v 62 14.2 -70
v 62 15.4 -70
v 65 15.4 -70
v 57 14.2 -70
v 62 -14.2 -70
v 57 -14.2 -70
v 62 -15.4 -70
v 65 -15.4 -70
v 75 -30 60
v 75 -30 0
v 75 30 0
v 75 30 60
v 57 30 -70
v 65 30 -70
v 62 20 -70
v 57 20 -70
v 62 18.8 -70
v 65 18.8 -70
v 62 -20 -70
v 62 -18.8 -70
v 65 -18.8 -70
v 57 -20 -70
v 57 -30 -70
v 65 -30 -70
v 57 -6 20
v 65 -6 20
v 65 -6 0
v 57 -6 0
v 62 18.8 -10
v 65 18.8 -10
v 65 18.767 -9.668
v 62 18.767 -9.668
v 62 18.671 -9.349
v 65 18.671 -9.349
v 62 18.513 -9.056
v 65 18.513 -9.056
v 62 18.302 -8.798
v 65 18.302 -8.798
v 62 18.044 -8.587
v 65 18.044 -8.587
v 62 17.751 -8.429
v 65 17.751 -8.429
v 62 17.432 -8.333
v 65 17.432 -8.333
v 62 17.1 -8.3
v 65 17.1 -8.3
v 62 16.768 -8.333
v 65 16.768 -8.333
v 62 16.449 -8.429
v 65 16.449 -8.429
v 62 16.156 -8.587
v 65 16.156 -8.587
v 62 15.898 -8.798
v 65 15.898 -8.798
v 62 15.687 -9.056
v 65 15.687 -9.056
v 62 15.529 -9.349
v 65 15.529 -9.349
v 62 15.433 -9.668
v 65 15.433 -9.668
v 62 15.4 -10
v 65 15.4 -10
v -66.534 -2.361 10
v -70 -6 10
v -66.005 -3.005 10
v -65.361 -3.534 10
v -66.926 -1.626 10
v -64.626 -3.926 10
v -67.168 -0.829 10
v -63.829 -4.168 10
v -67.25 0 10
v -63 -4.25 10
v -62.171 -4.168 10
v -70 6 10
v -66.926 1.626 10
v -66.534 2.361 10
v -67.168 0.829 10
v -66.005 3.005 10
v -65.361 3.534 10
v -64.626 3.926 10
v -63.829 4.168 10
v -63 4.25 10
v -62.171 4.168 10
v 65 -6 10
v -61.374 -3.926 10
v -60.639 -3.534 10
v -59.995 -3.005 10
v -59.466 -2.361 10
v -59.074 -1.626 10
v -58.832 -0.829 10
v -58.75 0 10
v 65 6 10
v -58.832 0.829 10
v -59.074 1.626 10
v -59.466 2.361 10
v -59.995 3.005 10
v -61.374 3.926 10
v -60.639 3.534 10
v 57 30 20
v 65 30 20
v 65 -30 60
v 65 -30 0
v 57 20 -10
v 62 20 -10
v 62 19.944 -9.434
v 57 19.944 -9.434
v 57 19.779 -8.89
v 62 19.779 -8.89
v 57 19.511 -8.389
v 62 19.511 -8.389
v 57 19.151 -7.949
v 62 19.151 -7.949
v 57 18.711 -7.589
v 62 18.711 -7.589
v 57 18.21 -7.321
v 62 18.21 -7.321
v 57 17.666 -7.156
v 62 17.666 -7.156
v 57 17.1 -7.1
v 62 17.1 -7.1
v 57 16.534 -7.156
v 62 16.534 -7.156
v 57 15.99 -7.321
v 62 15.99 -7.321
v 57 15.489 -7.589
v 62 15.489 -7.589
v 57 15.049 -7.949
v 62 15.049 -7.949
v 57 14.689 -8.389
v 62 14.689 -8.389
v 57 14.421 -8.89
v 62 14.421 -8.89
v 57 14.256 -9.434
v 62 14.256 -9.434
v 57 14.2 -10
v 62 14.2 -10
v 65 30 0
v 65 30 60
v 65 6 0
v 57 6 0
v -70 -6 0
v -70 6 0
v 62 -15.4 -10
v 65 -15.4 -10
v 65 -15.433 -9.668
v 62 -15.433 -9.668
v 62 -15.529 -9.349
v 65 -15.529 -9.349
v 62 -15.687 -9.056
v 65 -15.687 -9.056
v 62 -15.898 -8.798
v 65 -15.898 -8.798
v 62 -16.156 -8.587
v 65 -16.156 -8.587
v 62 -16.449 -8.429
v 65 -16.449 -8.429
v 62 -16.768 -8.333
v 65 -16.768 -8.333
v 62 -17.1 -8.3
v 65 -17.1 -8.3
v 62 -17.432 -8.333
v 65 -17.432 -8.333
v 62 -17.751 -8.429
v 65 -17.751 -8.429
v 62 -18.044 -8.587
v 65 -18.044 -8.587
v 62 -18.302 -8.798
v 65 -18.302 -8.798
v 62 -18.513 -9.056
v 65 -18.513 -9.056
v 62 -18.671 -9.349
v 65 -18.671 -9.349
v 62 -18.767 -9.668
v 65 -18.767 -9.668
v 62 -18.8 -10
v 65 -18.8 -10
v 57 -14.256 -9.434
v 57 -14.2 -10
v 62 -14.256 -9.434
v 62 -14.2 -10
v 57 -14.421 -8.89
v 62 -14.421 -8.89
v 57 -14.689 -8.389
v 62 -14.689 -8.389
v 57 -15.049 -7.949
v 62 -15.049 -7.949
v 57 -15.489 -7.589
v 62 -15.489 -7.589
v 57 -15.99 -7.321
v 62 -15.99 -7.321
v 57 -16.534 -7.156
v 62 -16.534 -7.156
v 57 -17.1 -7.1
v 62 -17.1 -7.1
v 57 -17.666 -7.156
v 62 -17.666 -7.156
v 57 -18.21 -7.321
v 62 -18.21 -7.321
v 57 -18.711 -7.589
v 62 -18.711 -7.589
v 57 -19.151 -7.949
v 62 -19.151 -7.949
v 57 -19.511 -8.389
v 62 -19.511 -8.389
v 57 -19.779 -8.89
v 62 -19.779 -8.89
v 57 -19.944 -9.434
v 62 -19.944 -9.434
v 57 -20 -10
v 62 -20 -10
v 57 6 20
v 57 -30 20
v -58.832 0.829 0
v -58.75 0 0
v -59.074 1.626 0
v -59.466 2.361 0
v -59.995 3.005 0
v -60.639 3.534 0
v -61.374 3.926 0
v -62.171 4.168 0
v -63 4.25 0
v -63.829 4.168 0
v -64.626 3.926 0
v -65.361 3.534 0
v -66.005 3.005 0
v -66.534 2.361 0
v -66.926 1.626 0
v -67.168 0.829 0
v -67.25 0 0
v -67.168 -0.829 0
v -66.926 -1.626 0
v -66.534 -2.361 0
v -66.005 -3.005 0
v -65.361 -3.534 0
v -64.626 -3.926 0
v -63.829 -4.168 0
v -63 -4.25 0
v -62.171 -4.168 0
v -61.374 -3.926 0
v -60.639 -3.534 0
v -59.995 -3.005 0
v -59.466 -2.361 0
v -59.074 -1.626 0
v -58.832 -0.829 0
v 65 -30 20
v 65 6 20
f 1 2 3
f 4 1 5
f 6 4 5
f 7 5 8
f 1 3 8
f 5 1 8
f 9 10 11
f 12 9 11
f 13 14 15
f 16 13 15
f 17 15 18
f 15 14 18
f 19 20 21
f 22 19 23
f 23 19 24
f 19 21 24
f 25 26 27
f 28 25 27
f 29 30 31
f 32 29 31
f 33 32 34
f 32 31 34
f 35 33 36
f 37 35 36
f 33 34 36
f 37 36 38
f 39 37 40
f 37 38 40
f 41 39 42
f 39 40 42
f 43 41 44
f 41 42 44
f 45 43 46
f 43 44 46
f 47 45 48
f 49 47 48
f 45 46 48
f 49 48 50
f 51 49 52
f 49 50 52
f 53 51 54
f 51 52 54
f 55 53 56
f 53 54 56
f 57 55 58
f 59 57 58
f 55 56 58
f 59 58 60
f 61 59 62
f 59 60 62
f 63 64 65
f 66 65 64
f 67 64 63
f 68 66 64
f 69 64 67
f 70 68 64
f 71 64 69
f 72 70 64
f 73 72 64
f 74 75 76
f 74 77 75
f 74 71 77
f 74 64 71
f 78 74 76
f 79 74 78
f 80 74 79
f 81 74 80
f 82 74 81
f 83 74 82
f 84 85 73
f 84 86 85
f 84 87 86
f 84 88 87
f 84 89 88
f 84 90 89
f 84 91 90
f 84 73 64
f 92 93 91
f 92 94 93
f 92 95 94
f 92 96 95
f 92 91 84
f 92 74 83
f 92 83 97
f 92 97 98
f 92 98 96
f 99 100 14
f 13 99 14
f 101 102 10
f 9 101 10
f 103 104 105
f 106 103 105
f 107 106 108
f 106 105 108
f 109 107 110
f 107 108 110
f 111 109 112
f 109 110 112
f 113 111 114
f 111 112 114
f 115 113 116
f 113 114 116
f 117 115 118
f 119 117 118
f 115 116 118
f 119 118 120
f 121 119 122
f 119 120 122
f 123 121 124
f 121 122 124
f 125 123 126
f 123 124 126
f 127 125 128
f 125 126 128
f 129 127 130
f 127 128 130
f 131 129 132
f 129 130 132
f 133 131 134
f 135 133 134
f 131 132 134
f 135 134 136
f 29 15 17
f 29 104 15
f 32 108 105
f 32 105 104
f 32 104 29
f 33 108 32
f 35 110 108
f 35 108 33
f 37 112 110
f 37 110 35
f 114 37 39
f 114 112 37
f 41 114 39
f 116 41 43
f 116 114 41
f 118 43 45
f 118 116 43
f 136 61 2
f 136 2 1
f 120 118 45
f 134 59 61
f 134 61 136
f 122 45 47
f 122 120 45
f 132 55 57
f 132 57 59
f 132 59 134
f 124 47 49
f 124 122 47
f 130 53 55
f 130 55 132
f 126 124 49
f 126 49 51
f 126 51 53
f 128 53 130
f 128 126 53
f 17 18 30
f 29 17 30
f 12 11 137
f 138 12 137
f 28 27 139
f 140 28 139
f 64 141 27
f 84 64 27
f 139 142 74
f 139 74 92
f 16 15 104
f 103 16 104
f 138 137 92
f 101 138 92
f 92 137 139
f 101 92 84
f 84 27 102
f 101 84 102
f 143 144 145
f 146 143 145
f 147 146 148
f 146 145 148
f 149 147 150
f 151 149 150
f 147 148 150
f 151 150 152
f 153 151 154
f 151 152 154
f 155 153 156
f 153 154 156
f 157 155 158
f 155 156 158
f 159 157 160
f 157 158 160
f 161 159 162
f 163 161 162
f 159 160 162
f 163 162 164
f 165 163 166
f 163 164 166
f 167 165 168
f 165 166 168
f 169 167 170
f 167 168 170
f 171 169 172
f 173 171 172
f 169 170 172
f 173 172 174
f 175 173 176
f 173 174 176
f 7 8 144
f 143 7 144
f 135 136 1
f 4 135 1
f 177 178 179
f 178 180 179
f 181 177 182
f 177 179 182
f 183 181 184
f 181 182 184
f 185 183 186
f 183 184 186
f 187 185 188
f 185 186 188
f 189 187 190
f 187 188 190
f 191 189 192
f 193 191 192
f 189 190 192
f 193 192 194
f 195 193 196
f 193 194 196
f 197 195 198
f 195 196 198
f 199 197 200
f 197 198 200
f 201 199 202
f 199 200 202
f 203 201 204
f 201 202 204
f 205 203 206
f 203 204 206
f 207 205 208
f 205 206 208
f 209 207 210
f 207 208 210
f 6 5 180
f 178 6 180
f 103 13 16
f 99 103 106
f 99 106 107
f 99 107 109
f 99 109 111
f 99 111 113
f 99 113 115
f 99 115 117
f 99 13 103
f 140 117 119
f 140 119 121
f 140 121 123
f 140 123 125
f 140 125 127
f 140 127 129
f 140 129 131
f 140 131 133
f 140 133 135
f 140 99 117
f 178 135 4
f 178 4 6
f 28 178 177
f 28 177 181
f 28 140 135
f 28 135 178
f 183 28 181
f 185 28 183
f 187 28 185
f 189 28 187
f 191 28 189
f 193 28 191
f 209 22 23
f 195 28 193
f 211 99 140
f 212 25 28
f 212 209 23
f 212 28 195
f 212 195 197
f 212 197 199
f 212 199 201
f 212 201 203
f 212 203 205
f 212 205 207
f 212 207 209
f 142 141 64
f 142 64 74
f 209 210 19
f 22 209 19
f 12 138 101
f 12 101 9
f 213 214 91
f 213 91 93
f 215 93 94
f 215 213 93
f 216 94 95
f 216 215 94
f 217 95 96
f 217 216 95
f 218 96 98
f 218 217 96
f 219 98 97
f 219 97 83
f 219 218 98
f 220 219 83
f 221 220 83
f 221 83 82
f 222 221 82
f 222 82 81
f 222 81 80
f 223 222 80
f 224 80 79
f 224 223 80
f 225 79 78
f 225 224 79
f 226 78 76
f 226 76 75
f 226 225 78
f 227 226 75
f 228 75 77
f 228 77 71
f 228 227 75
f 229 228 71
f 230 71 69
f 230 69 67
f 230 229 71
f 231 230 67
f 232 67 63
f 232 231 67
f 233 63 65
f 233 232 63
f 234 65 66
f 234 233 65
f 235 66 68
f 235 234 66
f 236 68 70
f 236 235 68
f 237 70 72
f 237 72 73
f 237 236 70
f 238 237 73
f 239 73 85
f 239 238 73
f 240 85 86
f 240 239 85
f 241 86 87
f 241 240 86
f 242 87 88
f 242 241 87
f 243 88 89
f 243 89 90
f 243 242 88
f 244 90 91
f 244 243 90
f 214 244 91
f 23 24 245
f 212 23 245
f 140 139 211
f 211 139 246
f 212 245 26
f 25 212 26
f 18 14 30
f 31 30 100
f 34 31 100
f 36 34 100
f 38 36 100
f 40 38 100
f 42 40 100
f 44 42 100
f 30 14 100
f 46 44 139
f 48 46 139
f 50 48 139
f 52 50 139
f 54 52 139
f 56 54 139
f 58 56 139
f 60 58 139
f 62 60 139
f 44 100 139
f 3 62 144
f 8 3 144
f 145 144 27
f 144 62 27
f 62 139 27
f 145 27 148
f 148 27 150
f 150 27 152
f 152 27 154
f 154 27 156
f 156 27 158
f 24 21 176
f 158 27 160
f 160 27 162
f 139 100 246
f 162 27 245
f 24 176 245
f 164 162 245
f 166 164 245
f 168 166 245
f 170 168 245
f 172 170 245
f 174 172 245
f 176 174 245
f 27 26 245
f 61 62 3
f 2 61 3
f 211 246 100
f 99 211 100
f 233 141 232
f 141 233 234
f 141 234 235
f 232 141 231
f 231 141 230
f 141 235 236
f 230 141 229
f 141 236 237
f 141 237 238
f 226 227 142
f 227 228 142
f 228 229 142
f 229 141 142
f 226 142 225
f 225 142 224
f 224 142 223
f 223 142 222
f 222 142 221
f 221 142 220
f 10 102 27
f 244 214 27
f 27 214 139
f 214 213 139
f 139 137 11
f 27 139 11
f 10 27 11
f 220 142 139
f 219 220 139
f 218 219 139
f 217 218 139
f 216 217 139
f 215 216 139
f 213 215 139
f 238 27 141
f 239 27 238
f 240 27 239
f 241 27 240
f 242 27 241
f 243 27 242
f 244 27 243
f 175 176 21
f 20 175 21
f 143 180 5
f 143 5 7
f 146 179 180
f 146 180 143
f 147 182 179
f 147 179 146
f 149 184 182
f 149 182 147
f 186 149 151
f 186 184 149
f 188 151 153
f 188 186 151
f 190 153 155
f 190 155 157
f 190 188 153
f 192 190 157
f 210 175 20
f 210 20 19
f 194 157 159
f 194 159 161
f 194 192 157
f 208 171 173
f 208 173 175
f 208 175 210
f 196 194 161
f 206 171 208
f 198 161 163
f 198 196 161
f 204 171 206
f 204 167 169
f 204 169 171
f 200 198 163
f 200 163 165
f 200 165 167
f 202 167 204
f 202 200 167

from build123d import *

# Parameters (mm, degrees)
F0_W     = 135
F0_H     = 12
F0_R     = 4.25
F1_DEPTH = 10
F0_W_2   = 5
F2_DEPTH = 60
F4_DEPTH = 5
F5_DEPTH = 3


with BuildPart() as f1:
    # F0 (on Top) → F1 (new body)
    with BuildSketch(Plane.XY):
        with Locations((-2.5, 0)):
            Rectangle(F0_W, F0_H)
        with Locations((-63, 0)):
            Circle(F0_R, mode=Mode.SUBTRACT)
    extrude(amount=F1_DEPTH)

    # F0 (on Top) → F2 (join)
    with BuildSketch(Plane.XY):
        Polygon((65, 30), (65, 6), (70, 6), (70, -6), (65, -6), (65, -30), (75, -30), (75, 30), align=None)
        with Locations((67.5, 0)):
            Rectangle(F0_W_2, F0_H)
    extrude(amount=F2_DEPTH)


with BuildPart() as f4:
    # F3 (on face) → F4 (new body)
    with BuildSketch(Plane(origin=(65, 0, 0), x_dir=(0, -1, 0), z_dir=(-1, 0, 0))):
        with BuildLine():
            Line((-6, 0), (-30, 0))
            Line((-30, 0), (-30, -70))
            Line((-30, -70), (-20, -70))
            Line((-20, -70), (-20, -10))
            ThreePointArc((-20, -10), (-17.1, -7.1), (-14.2, -10))
            Line((-14.2, -10), (-14.2, -70))
            Line((-14.2, -70), (14.2, -70))
            Line((14.2, -70), (14.2, -10))
            ThreePointArc((14.2, -10), (17.1, -7.1), (20, -10))
            Line((20, -10), (20, -70))
            Line((20, -70), (30, -70))
            Line((30, -70), (30, 0))
            Line((30, 0), (6, 0))
            Line((6, 0), (-6, 0))
        make_face()
        Polygon((-30, 20), (-30, 0), (-6, 0), (-6, 10), (-6, 20), align=None)
        Polygon((6, 10), (6, 0), (30, 0), (30, 20), (6, 20), align=None)
    extrude(amount=F4_DEPTH)

    # F3 (on face) + F4_face (on face) + F4_face1 (on face) → F5 (join)
    with BuildSketch(Plane(origin=(65, 0, 0), x_dir=(0, -1, 0), z_dir=(-1, 0, 0))):
        with BuildLine():
            Line((-20, -10), (-20, -70))
            Line((-20, -70), (-18.8, -70))
            Line((-18.8, -70), (-18.8, -10))
            ThreePointArc((-18.8, -10), (-17.1, -8.3), (-15.4, -10))
            Line((-15.4, -10), (-15.4, -70))
            Line((-15.4, -70), (-14.2, -70))
            Line((-14.2, -70), (-14.2, -10))
            ThreePointArc((-14.2, -10), (-17.1, -7.1), (-20, -10))
        make_face()
        with BuildLine():
            Line((18.8, -70), (20, -70))
            Line((20, -70), (20, -10))
            ThreePointArc((20, -10), (17.1, -7.1), (14.2, -10))
            Line((14.2, -10), (14.2, -70))
            Line((14.2, -70), (15.4, -70))
            Line((15.4, -70), (15.4, -10))
            ThreePointArc((15.4, -10), (17.1, -8.3), (18.8, -10))
            Line((18.8, -10), (18.8, -70))
        make_face()
        with BuildLine():
            Line((-6, 0), (-30, 0))
            Line((-30, 0), (-30, -70))
            Line((-30, -70), (-20, -70))
            Line((-20, -70), (-20, -10))
            ThreePointArc((-20, -10), (-17.1, -7.1), (-14.2, -10))
            Line((-14.2, -10), (-14.2, -70))
            Line((-14.2, -70), (14.2, -70))
            Line((14.2, -70), (14.2, -10))
            ThreePointArc((14.2, -10), (17.1, -7.1), (20, -10))
            Line((20, -10), (20, -70))
            Line((20, -70), (30, -70))
            Line((30, -70), (30, 0))
            Line((30, 0), (6, 0))
            Line((6, 0), (-6, 0))
        make_face()
    with BuildSketch(Plane(origin=(60, 0, -24.6369260479), x_dir=(0, -1, 0), z_dir=(-1, 0, 0))):
        with BuildLine():
            Line((20, 14.6369260479), (20, -45.3630739521))
            Line((20, -45.3630739521), (30, -45.3630739521))
            Line((30, -45.3630739521), (30, 44.6369260479))
            Line((30, 44.6369260479), (6, 44.6369260479))
            Line((6, 44.6369260479), (6, 24.6369260479))
            Line((6, 24.6369260479), (-6, 24.6369260479))
            Line((-6, 24.6369260479), (-6, 44.6369260479))
            Line((-6, 44.6369260479), (-30, 44.6369260479))
            Line((-30, 44.6369260479), (-30, -45.3630739521))
            Line((-30, -45.3630739521), (-20, -45.3630739521))
            Line((-20, -45.3630739521), (-20, 14.6369260479))
            ThreePointArc((-20, 14.6369260479), (-17.1, 17.5369260479), (-14.2, 14.6369260479))
            Line((-14.2, 14.6369260479), (-14.2, -45.3630739521))
            Line((-14.2, -45.3630739521), (14.2, -45.3630739521))
            Line((14.2, -45.3630739521), (14.2, 14.6369260479))
            ThreePointArc((14.2, 14.6369260479), (17.1, 17.5369260479), (20, 14.6369260479))
        make_face()
    with BuildSketch(Plane(origin=(65, 0, -24.6369260479), x_dir=(0, -1, 0), z_dir=(1, 0, 0))):
        with BuildLine():
            Line((20, 45.3630739521), (20, -14.6369260479))
            ThreePointArc((20, -14.6369260479), (17.1, -17.5369260479), (14.2, -14.6369260479))
            Line((14.2, -14.6369260479), (14.2, 45.3630739521))
            Line((14.2, 45.3630739521), (-14.2, 45.3630739521))
            Line((-14.2, 45.3630739521), (-14.2, -14.6369260479))
            ThreePointArc((-14.2, -14.6369260479), (-17.1, -17.5369260479), (-20, -14.6369260479))
            Line((-20, -14.6369260479), (-20, 45.3630739521))
            Line((-20, 45.3630739521), (-30, 45.3630739521))
            Line((-30, 45.3630739521), (-30, -44.6369260479))
            Line((-30, -44.6369260479), (-6, -44.6369260479))
            Line((-6, -44.6369260479), (-6, -24.6369260479))
            Line((-6, -24.6369260479), (6, -24.6369260479))
            Line((6, -24.6369260479), (6, -44.6369260479))
            Line((6, -44.6369260479), (30, -44.6369260479))
            Line((30, -44.6369260479), (30, 45.3630739521))
            Line((30, 45.3630739521), (20, 45.3630739521))
        make_face()
    extrude(amount=F5_DEPTH, dir=(-1, 0, 0))


solid = Compound([f1.part, f4.part])
